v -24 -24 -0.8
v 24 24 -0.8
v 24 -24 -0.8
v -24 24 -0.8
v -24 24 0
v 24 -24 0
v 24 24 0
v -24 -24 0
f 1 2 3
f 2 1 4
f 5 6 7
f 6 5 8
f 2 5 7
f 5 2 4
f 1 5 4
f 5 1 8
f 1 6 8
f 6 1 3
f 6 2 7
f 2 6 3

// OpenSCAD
// file: ../p/box.scad
use <../lib.scad>
function ldraw_lib__box() = [
// 0 Box 6 (six faces)
// 0 Name: box.dat
// 0 Author: James Jessiman
// 0 !LDRAW_ORG Primitive UPDATE 2002-05
// 0 !LICENSE Licensed under CC BY 4.0 : see CAreadme.txt
// 
// 0 BFC CERTIFY CCW
  [0,"BFC","CERTIFY"],
  [0,"BFC","CCW"],
// 
// 0 !HISTORY 2002-08-22 [sbliss] Applied BFC
// 0 !HISTORY 2002-11-30 [PTadmin] Official Update 2002-05
// 0 !HISTORY 2007-06-24 [PTadmin] Header formatted for Contributor Agreement
// 0 !HISTORY 2008-07-01 [PTadmin] Official Update 2008-01
// 
// 
// 2 24 1 1 1 -1 1 1
  [2,24,1,1,1,-1,1,1],
// 2 24 -1 1 1 -1 1 -1
  [2,24,-1,1,1,-1,1,-1],
// 2 24 -1 1 -1 1 1 -1
  [2,24,-1,1,-1,1,1,-1],
// 2 24 1 1 -1 1 1 1
  [2,24,1,1,-1,1,1,1],
// 2 24 1 -1 1 -1 -1 1
  [2,24,1,-1,1,-1,-1,1],
// 2 24 -1 -1 1 -1 -1 -1
  [2,24,-1,-1,1,-1,-1,-1],
// 2 24 -1 -1 -1 1 -1 -1
  [2,24,-1,-1,-1,1,-1,-1],
// 2 24 1 -1 -1 1 -1 1
  [2,24,1,-1,-1,1,-1,1],
// 2 24 1 -1 1 1 1 1
  [2,24,1,-1,1,1,1,1],
// 2 24 -1 -1 1 -1 1 1
  [2,24,-1,-1,1,-1,1,1],
// 2 24 1 -1 -1 1 1 -1
  [2,24,1,-1,-1,1,1,-1],
// 2 24 -1 -1 -1 -1 1 -1
  [2,24,-1,-1,-1,-1,1,-1],
// 4 16 1 1 1 1 1 -1 -1 1 -1 -1 1 1
  [4,16,1,1,1,1,1,-1,-1,1,-1,-1,1,1],
// 4 16 -1 -1 -1 1 -1 -1 1 -1 1 -1 -1 1
  [4,16,-1,-1,-1,1,-1,-1,1,-1,1,-1,-1,1],
// 4 16 -1 -1 1 1 -1 1 1 1 1 -1 1 1
  [4,16,-1,-1,1,1,-1,1,1,1,1,-1,1,1],
// 4 16 -1 -1 -1 -1 -1 1 -1 1 1 -1 1 -1
  [4,16,-1,-1,-1,-1,-1,1,-1,1,1,-1,1,-1],
// 4 16 1 -1 -1 -1 -1 -1 -1 1 -1 1 1 -1
  [4,16,1,-1,-1,-1,-1,-1,-1,1,-1,1,1,-1],
// 4 16 1 -1 1 1 -1 -1 1 1 -1 1 1 1
  [4,16,1,-1,1,1,-1,-1,1,1,-1,1,1,1],
// 0
];
module ldraw_lib__box(step=0, col=false, unit=2/5, alt=false, line=0.2, solid=!$preview)
    makepoly(ldraw_lib__box(), step=step, col=col, unit=unit, alt=alt, line=line, solid=solid);
ldraw_lib__box(line=0.2);
// main file
use <../lib.scad>
use <../p/box.scad>
function ldraw_lib__u9253() = [
// 0 Cardboard  6 x  6 Thick with Sharp Corners
// 0 Name: u9253.dat
// 0 Author: Steffen [Steffen]
// 0 !LDRAW_ORG Part UPDATE 2020-02
// 0 !LICENSE Licensed under CC BY 4.0 : see CAreadme.txt
// 
// 0 BFC CERTIFY CCW
  [0,"BFC","CERTIFY"],
  [0,"BFC","CCW"],
// 
// 0 !CATEGORY Sheet Cardboard
// 0 !KEYWORDS Scala, set 4336
// 
// 0 !HISTORY 2020-09-05 [PTadmin] Official Update 2020-02
// 
// 
// 1 16 0 1 0 60 0 0 0 1 0 0 0 60 box.dat
  [1,16,0,1,0,60,0,0,0,1,0,0,0,60, ldraw_lib__box()],
];
module ldraw_lib__u9253(step=0, col=false, unit=2/5, alt=false, line=0.2, solid=!$preview)
    makepoly(ldraw_lib__u9253(), step=step, col=col, unit=unit, alt=alt, line=line, solid=solid);
ldraw_lib__u9253(line=0.2);
